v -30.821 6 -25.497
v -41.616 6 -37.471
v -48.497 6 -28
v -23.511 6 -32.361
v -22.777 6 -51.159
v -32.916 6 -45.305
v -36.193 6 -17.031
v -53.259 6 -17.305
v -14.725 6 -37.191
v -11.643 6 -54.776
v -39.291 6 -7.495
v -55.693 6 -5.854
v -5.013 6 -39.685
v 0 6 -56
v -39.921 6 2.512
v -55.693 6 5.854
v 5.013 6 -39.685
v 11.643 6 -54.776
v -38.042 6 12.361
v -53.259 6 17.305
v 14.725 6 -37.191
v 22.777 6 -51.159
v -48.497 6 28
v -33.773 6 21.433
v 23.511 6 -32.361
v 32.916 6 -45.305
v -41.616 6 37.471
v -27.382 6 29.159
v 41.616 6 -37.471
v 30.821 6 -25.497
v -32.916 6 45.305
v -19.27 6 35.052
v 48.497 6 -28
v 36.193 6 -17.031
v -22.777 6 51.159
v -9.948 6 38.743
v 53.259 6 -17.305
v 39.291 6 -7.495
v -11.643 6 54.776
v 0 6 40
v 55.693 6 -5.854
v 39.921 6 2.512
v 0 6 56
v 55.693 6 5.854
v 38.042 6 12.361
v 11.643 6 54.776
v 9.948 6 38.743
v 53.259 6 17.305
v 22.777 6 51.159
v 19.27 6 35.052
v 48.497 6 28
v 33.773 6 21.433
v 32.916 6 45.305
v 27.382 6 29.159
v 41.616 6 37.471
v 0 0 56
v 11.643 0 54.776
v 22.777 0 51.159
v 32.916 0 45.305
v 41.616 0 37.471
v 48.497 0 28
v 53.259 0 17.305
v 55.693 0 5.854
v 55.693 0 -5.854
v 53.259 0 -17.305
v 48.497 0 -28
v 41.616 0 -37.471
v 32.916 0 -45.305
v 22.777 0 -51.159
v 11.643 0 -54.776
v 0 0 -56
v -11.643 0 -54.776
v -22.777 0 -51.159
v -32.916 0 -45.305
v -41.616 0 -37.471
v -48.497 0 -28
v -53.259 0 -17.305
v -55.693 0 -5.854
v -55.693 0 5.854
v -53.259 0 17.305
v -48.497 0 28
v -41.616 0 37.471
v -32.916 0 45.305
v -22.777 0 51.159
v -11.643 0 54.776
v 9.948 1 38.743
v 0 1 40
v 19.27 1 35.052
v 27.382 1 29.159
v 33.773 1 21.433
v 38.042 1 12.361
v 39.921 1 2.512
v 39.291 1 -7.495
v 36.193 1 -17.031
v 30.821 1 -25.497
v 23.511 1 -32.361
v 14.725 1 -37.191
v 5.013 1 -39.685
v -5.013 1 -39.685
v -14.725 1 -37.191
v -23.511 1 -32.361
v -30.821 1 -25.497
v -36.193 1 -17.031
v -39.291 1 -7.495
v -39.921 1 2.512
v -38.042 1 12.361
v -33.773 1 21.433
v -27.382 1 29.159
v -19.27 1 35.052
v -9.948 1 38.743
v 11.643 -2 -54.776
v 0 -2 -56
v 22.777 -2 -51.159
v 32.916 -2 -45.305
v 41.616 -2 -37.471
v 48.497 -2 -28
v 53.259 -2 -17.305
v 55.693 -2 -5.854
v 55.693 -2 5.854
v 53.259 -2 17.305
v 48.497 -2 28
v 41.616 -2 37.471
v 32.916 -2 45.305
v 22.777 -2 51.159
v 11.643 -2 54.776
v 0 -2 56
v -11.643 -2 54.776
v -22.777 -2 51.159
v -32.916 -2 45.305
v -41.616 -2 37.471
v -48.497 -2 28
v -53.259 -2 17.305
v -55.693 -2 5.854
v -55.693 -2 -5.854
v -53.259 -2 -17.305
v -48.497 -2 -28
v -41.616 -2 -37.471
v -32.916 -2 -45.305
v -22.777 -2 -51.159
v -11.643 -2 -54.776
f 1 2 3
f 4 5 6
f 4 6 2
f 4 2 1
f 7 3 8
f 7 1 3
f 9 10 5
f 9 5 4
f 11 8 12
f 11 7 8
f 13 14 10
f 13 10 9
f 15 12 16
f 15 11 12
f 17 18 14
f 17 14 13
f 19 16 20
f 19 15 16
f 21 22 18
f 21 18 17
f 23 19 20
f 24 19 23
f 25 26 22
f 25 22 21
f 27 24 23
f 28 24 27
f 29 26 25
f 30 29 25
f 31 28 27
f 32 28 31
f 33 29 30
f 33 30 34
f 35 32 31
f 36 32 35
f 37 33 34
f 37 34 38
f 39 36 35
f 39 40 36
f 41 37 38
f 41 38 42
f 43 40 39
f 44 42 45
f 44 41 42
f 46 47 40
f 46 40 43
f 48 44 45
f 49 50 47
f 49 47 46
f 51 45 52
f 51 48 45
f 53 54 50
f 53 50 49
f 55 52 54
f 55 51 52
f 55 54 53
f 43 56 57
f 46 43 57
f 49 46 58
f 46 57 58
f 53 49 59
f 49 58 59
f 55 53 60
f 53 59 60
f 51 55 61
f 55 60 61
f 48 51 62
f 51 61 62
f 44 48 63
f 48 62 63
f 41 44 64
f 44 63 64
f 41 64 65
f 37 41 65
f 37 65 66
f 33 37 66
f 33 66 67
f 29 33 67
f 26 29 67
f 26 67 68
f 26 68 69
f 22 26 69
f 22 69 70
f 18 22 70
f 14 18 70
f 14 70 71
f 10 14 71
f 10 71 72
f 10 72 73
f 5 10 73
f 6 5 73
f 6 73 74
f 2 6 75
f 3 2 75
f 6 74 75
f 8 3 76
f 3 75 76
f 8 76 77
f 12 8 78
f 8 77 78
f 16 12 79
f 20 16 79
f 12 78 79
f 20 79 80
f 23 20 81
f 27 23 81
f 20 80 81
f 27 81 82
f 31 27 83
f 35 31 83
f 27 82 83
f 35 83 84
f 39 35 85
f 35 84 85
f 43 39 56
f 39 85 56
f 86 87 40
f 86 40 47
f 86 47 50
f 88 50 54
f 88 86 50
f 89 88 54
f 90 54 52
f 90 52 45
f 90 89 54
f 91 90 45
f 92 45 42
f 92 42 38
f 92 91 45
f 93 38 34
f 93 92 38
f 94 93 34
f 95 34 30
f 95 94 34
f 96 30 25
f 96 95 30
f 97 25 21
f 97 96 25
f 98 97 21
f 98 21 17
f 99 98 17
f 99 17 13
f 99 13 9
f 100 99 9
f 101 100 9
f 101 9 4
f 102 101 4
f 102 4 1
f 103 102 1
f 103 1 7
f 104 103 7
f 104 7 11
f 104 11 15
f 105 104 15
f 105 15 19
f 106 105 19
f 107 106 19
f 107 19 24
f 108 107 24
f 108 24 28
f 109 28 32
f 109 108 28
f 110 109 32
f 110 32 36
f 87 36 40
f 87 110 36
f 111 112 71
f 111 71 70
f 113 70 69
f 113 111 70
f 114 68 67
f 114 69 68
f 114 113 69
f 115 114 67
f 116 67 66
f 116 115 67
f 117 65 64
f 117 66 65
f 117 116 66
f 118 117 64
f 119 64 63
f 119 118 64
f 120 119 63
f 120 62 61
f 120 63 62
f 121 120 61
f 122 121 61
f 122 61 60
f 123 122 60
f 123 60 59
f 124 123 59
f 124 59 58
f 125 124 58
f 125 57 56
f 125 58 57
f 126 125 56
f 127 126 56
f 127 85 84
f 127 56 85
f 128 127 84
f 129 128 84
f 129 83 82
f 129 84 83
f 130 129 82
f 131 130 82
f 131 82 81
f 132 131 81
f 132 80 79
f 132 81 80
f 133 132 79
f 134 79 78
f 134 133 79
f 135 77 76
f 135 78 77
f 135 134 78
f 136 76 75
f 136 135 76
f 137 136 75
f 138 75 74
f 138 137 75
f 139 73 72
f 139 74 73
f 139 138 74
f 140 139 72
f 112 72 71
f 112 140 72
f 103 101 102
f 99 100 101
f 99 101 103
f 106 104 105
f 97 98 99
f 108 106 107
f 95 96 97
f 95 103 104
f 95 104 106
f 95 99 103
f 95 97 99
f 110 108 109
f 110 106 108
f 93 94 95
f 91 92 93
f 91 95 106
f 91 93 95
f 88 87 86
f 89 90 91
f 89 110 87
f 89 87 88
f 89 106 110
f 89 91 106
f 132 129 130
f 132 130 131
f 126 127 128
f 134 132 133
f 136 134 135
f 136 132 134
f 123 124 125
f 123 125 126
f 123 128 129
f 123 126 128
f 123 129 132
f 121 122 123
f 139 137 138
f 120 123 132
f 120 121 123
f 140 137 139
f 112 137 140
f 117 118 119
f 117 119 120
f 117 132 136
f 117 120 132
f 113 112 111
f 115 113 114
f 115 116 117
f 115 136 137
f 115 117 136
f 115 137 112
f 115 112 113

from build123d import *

# Parameters (mm, degrees)
ESBO_O1_R                = 56
ESBO_O1_R_2              = 40
RESSALTO_EXTRUS_O1_DEPTH = 6
RESSALTO_EXTRUS_O2_START = 2
ESBO_O2_R                = 56
RESSALTO_EXTRUS_O2_DEPTH = 2
ESBO_O3_R                = 40
RESSALTO_EXTRUS_O3_DEPTH = 1


with BuildPart() as part:
    # Esboço1 → Ressalto-extrusão1 (new body)
    with BuildSketch(Plane(origin=(0, 0, 0), x_dir=(1, 0, 0), z_dir=(0, 1, 0))):
        with Locations(Location((0, 0, 0), (0, 0, 270))):
            Circle(ESBO_O1_R)
        with Locations(Location((0, 0, 0), (0, 0, 270))):
            Circle(ESBO_O1_R_2, mode=Mode.SUBTRACT)
    extrude(amount=RESSALTO_EXTRUS_O1_DEPTH)

    # Esboço2 → Ressalto-extrusão2 (add)
    with BuildSketch(Plane.XZ.offset(RESSALTO_EXTRUS_O2_START)):
        with Locations(Location((0, 0, 0), (0, 0, 270))):
            Circle(ESBO_O2_R)
    extrude(amount=-RESSALTO_EXTRUS_O2_DEPTH)

    # Esboço3 → Ressalto-extrusão3 (add)
    with BuildSketch(Plane(origin=(0, 0, 0), x_dir=(1, 0, 0), z_dir=(0, 1, 0))):
        with Locations(Location((0, 0, 0), (0, 0, 270))):
            Circle(ESBO_O3_R)
    extrude(amount=RESSALTO_EXTRUS_O3_DEPTH)


solid = part.part
